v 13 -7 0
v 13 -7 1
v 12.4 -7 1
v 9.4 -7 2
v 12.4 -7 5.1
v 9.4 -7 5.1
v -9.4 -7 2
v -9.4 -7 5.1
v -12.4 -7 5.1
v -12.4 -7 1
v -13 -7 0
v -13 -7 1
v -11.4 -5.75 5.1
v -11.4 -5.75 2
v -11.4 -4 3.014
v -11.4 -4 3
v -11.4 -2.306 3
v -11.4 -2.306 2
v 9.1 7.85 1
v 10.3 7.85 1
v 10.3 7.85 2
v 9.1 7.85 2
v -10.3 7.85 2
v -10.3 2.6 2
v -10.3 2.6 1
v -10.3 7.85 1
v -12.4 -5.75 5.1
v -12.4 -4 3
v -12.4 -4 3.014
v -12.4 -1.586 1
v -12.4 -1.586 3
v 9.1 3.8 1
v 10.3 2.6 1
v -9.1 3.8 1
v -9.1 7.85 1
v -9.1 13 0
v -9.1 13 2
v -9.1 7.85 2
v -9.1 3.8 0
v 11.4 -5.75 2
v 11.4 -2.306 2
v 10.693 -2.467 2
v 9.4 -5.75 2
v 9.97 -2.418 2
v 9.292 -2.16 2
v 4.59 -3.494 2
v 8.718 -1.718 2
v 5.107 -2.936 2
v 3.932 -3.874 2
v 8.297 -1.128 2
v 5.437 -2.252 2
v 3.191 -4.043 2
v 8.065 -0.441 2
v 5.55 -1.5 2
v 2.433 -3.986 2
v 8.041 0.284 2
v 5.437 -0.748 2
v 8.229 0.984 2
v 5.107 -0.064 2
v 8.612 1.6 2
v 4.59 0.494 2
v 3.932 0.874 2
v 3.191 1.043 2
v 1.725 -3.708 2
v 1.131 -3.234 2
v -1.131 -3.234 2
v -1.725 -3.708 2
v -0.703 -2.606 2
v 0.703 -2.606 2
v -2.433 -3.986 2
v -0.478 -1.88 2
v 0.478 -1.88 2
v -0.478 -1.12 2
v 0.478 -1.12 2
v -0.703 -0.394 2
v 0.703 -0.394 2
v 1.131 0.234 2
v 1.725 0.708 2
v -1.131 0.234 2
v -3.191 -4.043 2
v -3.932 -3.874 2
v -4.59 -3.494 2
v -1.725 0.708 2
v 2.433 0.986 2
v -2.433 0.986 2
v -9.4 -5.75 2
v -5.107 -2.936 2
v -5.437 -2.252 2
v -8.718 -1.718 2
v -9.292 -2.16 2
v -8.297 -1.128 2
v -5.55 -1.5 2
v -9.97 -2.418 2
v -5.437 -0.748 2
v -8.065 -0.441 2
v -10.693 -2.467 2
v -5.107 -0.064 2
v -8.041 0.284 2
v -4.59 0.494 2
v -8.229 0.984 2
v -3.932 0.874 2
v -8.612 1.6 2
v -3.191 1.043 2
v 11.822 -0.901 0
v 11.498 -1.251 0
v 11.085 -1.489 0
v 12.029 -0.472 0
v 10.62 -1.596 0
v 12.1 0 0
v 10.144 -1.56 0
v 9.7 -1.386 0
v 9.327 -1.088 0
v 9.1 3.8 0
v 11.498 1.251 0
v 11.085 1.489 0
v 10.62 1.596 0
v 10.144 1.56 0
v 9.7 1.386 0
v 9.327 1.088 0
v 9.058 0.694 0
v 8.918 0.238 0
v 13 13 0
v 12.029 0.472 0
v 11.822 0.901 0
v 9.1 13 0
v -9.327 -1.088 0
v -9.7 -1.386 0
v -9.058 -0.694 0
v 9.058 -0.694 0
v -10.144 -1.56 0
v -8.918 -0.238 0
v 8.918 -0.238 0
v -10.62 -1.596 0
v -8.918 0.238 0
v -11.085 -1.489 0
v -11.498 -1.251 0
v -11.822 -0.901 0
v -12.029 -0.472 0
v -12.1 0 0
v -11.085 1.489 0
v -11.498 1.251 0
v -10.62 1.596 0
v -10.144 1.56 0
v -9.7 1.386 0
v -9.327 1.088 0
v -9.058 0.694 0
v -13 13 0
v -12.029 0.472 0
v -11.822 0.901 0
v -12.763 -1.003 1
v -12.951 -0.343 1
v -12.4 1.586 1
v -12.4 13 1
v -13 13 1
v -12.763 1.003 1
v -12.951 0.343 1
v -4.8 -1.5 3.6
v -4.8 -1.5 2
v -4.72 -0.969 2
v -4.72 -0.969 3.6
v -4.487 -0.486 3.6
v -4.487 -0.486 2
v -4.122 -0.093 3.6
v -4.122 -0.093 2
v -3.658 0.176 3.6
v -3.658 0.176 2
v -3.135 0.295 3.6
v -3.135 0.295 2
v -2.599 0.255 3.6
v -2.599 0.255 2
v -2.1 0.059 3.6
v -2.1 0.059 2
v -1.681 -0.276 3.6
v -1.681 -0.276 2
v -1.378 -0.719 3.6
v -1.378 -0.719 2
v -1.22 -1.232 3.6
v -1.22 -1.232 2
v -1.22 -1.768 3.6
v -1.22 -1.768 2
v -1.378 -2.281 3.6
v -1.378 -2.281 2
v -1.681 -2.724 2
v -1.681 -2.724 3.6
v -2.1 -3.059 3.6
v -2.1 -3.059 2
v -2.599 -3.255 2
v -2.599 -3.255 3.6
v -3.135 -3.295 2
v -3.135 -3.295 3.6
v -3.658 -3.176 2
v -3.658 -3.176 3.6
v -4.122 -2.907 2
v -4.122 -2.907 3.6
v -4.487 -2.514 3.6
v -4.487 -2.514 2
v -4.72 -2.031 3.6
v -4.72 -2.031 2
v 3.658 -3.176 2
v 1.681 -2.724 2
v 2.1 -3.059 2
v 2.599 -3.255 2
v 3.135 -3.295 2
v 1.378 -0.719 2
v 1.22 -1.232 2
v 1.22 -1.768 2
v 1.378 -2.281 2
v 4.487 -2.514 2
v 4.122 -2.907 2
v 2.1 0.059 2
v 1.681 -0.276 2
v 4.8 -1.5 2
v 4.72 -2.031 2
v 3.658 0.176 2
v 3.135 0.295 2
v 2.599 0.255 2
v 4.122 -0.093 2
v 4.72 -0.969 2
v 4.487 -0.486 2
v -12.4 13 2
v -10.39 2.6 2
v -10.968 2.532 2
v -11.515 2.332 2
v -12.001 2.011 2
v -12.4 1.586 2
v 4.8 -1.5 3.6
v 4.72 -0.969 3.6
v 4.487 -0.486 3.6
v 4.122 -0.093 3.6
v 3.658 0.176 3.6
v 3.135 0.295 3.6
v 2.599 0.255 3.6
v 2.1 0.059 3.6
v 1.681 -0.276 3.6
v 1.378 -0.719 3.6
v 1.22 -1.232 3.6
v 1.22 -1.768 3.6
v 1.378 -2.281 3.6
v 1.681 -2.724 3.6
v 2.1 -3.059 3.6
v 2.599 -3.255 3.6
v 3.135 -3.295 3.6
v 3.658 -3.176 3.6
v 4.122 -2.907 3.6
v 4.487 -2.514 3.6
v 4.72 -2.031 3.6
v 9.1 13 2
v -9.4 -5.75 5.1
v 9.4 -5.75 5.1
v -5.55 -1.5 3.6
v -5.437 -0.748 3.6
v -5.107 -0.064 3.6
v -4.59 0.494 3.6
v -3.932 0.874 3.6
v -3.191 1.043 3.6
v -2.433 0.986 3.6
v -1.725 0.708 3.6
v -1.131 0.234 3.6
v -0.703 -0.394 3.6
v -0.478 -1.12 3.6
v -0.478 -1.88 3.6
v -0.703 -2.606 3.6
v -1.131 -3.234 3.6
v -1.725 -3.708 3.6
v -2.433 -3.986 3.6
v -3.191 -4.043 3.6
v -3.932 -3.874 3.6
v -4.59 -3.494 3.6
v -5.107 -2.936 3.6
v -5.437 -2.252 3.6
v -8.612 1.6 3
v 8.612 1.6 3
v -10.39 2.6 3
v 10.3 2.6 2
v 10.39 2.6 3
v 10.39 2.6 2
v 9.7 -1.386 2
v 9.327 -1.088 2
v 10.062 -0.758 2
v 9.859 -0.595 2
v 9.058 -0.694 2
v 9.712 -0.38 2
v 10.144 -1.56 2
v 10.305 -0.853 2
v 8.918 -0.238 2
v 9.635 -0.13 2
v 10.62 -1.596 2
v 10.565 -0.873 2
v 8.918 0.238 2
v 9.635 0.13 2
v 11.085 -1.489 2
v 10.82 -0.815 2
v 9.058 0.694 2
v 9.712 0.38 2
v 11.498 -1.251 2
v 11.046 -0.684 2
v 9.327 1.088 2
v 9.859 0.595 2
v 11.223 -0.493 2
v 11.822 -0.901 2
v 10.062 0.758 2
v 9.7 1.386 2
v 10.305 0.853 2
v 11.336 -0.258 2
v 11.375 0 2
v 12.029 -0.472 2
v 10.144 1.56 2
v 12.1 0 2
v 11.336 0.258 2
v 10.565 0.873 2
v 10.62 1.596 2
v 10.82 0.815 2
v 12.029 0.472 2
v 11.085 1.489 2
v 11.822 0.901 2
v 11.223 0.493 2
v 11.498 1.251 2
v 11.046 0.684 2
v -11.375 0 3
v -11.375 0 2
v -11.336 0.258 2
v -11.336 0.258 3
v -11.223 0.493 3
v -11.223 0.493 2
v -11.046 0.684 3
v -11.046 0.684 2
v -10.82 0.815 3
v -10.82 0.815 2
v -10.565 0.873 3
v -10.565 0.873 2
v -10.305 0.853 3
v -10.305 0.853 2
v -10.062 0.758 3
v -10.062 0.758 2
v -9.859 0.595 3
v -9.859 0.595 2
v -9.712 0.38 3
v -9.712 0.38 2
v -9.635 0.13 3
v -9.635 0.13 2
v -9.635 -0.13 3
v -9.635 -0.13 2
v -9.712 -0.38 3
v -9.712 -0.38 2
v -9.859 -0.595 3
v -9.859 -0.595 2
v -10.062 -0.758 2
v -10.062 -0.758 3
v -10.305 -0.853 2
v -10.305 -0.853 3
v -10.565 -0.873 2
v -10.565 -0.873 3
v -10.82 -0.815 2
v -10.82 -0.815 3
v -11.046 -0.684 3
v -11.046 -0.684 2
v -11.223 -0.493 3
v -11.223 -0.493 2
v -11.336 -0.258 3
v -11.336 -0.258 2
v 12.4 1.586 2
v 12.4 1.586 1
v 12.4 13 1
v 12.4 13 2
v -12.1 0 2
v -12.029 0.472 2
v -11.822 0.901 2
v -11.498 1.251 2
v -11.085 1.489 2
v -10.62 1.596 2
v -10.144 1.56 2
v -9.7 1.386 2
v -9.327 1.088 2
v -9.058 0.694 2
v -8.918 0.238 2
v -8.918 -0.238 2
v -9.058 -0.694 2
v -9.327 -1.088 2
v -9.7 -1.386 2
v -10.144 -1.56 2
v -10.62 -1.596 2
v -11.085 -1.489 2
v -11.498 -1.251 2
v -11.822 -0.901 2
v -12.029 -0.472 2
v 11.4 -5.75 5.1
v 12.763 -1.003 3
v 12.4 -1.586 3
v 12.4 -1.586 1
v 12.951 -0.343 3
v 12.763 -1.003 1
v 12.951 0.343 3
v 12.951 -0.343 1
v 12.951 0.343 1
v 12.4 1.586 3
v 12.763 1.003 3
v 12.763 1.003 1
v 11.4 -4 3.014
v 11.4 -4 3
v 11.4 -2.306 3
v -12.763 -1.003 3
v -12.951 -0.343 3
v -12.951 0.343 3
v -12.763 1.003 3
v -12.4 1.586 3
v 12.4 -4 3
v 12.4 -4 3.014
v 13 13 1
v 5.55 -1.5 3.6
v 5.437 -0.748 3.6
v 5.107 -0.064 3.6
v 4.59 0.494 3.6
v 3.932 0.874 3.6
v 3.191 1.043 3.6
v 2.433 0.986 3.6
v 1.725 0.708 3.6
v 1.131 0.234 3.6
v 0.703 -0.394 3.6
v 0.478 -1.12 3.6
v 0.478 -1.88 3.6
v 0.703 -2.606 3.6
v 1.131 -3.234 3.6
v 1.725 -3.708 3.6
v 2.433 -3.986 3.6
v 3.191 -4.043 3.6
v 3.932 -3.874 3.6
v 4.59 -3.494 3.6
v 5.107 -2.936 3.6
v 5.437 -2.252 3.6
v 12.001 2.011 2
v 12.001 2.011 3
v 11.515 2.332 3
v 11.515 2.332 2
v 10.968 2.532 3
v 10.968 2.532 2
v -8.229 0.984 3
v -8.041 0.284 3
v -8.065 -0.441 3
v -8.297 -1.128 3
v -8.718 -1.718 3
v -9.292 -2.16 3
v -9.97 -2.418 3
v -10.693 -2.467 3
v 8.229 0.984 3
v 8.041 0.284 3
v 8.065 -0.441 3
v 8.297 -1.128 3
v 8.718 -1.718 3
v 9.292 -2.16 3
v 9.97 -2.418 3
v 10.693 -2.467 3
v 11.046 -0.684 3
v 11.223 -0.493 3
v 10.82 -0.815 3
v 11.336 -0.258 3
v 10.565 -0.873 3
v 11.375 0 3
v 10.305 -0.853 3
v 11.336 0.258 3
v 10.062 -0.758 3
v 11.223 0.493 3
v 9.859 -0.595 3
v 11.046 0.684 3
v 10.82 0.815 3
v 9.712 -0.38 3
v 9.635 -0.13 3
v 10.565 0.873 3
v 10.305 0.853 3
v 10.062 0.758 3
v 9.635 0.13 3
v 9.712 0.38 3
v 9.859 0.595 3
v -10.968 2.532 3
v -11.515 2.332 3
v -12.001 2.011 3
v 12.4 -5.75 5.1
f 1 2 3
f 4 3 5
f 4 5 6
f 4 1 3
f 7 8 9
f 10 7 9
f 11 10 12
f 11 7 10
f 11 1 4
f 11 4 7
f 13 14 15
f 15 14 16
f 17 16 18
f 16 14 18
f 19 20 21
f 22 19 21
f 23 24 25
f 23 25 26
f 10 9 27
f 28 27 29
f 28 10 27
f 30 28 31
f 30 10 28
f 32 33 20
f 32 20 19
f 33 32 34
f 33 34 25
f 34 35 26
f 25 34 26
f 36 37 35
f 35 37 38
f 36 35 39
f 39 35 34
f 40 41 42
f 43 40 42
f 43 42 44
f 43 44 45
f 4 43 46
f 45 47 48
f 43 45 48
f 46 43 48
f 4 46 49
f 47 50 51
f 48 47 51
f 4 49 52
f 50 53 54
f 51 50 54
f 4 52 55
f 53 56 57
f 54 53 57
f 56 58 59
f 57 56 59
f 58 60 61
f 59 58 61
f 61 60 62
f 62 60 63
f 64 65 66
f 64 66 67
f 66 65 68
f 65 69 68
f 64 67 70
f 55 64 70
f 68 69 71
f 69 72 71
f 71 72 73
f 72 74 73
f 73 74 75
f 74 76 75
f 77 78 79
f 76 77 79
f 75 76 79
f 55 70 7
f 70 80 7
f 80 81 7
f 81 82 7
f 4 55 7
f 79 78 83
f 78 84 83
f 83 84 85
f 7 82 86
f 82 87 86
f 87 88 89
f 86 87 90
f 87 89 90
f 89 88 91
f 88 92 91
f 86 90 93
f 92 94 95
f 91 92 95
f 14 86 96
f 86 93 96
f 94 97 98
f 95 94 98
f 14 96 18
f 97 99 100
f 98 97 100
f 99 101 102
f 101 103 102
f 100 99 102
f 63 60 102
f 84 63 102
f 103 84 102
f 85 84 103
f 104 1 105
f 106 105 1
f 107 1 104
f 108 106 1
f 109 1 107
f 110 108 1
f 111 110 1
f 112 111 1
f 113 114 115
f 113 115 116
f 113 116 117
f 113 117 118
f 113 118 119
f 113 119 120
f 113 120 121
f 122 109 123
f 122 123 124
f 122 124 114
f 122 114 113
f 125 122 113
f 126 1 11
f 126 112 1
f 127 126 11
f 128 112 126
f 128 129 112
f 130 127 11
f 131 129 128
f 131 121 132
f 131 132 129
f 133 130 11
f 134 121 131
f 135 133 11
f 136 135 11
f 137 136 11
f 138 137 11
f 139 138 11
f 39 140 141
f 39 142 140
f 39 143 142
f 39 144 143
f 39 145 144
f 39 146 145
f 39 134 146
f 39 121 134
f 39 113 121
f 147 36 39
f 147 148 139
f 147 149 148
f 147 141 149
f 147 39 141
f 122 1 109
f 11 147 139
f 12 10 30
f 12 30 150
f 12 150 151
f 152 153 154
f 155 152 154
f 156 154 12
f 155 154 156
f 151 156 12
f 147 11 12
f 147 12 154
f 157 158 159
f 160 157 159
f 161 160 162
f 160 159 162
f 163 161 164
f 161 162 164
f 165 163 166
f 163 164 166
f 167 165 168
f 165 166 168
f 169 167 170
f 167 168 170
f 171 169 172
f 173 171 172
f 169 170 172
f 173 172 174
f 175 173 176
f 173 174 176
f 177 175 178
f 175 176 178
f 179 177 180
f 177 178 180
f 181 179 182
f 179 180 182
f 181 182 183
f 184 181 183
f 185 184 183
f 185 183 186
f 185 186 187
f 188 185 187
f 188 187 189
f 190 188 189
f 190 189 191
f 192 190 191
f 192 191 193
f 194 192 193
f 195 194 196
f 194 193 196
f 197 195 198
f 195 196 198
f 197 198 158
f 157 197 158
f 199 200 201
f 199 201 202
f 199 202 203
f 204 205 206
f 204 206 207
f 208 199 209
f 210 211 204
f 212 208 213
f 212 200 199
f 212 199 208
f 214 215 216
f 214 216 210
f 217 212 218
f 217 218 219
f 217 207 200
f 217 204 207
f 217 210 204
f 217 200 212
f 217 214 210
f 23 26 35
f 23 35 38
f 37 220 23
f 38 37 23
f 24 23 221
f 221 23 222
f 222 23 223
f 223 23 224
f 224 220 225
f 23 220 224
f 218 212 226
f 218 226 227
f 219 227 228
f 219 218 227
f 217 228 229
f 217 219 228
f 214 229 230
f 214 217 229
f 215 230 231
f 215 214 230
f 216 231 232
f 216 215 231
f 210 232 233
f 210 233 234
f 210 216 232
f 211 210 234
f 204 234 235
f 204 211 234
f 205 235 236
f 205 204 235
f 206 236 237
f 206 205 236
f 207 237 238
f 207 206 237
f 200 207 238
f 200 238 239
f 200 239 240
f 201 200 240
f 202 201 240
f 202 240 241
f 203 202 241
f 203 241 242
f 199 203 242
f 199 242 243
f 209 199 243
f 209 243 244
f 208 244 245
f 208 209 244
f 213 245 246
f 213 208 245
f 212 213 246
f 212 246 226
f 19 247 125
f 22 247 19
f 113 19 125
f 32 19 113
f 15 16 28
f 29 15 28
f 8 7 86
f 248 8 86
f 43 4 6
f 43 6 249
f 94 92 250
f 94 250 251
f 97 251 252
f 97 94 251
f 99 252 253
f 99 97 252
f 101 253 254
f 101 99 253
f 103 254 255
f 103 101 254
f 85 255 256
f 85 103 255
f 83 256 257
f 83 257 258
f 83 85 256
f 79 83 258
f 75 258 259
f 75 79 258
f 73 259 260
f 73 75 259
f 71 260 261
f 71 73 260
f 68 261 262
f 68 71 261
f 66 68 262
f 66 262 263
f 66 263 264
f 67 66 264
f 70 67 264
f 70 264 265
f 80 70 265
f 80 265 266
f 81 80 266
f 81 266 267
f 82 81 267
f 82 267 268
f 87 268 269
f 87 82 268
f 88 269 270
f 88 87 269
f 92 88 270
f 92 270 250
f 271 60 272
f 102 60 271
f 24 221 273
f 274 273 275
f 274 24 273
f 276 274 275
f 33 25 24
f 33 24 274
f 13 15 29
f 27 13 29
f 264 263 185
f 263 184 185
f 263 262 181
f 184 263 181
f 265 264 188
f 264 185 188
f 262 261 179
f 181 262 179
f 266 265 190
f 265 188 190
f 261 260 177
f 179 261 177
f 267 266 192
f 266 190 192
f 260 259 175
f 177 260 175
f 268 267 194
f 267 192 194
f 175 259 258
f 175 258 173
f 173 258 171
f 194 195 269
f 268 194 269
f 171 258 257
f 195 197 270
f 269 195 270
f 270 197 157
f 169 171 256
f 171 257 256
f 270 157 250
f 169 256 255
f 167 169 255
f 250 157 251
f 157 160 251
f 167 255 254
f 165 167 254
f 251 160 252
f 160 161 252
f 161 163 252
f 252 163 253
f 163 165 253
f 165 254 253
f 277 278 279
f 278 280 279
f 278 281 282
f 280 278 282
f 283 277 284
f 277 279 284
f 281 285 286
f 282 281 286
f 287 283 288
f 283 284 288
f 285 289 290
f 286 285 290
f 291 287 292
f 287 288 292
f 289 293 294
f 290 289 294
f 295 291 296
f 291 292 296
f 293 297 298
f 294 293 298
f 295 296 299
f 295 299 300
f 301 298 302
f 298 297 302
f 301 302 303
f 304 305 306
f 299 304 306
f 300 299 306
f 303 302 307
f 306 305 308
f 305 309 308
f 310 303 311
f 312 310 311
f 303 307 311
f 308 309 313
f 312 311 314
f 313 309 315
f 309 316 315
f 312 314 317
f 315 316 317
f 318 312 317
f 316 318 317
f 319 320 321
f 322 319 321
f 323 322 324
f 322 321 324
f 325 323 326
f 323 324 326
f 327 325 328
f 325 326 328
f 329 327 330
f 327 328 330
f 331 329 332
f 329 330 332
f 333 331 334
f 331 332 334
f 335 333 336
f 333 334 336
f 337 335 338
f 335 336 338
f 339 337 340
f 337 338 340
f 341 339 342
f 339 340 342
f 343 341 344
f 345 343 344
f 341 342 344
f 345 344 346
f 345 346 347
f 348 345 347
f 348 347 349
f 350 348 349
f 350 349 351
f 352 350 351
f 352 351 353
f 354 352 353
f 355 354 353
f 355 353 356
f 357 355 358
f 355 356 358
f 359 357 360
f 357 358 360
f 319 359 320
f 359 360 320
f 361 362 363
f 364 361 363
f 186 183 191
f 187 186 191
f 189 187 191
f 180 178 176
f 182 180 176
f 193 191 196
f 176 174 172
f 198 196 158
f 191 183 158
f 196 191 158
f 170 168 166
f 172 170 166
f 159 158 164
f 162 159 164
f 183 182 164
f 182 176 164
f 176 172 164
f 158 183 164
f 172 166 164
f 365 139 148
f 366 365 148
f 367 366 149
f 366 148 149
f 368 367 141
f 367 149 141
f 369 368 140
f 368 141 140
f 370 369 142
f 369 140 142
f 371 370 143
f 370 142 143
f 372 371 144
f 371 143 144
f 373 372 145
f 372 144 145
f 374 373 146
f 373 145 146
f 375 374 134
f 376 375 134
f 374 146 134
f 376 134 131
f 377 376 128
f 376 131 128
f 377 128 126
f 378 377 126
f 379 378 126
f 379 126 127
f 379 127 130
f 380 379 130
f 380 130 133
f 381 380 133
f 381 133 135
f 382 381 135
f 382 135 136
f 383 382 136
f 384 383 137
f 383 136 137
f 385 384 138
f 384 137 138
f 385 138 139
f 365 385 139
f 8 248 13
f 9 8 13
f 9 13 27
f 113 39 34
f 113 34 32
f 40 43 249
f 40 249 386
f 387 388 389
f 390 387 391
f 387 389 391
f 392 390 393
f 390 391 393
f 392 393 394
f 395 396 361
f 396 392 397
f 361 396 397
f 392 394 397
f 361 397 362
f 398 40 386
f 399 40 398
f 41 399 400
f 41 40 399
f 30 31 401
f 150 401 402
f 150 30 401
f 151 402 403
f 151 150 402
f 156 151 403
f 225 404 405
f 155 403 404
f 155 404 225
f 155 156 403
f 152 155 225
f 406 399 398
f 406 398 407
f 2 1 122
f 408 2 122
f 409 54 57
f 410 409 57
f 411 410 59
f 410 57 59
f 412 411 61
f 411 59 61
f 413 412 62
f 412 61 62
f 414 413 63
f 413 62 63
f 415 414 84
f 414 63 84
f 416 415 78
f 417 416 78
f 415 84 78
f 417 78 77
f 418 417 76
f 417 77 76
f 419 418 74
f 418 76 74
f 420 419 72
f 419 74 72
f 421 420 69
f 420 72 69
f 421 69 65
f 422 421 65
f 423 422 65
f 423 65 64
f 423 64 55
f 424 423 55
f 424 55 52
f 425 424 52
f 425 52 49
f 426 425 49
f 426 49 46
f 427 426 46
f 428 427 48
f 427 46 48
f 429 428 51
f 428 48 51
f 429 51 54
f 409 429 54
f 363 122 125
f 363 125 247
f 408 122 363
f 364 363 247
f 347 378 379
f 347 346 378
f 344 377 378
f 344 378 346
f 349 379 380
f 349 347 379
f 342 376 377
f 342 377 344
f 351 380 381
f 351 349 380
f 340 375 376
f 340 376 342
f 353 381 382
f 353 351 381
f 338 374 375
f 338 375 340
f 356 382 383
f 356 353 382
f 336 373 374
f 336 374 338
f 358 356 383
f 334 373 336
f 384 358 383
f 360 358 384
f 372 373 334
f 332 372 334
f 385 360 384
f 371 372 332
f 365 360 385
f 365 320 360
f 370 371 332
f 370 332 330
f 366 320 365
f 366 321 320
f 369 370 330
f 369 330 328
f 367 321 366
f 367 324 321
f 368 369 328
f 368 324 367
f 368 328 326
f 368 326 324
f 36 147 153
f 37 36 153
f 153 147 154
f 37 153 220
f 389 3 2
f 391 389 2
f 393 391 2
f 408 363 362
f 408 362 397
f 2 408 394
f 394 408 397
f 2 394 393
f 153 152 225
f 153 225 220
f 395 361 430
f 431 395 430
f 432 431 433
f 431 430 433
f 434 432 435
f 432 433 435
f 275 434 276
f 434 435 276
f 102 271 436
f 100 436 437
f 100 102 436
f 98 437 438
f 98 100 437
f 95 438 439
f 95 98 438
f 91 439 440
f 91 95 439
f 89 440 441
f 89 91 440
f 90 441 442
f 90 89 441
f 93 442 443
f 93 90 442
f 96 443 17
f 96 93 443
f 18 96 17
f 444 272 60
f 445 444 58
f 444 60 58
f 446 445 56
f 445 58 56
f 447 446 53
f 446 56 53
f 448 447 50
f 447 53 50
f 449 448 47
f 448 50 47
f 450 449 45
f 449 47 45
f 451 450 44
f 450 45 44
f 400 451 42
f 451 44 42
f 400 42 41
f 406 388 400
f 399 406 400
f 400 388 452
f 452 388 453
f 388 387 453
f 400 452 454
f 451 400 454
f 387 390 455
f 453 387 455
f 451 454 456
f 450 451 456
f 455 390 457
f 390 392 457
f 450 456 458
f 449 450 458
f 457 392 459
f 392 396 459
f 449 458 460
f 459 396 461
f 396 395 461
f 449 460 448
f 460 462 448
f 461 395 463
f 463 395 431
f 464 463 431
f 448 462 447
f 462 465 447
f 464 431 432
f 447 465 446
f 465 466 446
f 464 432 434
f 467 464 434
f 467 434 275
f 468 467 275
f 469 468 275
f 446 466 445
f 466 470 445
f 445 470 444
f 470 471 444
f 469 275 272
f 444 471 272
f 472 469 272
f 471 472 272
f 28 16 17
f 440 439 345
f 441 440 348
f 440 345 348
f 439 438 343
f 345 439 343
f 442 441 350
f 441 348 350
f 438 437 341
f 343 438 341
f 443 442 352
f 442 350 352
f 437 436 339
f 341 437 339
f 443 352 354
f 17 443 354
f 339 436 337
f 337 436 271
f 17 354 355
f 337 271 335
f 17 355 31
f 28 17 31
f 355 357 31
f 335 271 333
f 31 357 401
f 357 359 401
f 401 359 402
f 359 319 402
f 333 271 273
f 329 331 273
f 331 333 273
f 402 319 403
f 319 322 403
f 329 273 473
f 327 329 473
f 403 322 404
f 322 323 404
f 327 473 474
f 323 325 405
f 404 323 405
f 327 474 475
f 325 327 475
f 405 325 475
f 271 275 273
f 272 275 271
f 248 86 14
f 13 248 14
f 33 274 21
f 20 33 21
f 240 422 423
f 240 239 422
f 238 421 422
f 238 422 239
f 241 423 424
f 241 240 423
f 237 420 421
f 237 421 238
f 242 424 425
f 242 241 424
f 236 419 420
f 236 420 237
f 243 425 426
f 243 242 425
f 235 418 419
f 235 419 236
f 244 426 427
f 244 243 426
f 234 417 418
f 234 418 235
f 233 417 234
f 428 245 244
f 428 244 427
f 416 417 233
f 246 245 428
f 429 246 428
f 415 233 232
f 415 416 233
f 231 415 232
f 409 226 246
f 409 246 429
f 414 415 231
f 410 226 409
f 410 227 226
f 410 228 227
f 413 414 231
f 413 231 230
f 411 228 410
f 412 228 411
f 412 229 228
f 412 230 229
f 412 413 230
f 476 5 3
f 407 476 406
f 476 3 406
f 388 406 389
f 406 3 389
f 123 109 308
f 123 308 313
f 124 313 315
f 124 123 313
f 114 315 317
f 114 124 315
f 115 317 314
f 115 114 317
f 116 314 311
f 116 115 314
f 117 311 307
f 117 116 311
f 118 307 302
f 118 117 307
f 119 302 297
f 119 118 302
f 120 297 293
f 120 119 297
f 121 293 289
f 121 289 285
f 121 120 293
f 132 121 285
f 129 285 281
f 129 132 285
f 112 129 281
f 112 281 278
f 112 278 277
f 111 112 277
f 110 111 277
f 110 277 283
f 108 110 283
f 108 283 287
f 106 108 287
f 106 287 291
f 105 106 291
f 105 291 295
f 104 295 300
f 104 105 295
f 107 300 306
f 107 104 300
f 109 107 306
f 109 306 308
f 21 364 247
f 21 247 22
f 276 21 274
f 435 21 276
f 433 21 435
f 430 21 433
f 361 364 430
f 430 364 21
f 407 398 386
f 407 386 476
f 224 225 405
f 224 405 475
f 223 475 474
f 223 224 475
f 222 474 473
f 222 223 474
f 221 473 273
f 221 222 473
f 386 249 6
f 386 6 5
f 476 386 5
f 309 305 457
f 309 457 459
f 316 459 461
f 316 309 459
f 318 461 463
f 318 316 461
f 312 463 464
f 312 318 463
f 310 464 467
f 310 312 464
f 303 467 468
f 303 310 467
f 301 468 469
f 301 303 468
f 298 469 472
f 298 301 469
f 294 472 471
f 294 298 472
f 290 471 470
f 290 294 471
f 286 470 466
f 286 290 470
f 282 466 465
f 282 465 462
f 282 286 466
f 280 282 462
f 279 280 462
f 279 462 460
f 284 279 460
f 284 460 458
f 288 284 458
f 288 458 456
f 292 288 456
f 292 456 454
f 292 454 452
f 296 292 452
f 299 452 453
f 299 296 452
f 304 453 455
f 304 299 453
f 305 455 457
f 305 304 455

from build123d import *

# Parameters (mm, degrees)
F1_DEPTH     = 2
F2_W         = 0.6
F2_H         = 20
F3_DEPTH     = 1
F5_DEPTH     = 1
F6_W         = 3
F6_H         = 1.25
F7_DEPTH     = 3.1
F8_W         = 1
F8_H         = 1.75
F9_DEPTH     = 2.1
F10_SIZE2    = 2.085568787
F10_SIZE     = 1.75
F11_R        = 2.475
F11_R_2      = 0.875
F12_DEPTH    = 3
F13_T1_DEPTH = 6.0259261824
F14_R        = 0.875
F15_DEPTH    = 5.101
F17_DEPTH    = 1
F18_W        = 5.15
F18_H        = 1
F19_DEPTH    = 1.2
F20_R        = 1.6
F21_DEPTH    = 2
F22_R        = 2.55
F22_R_2      = 1.8
F23_DEPTH    = 1.6


# Not quite as in the source:
# - a fillet or chamfer that OpenCascade refuses, or shapes differently, is made with other operations: its cross-section is extruded or revolved along the edge and cut away or added


with BuildPart() as f1:
    # F0 (on Top) → F1 (new body)
    with BuildSketch(Plane.XY):
        Polygon((0, 3.8), (0, -7), (13, -7), (13, 13), (9.1, 13), (9.1, 3.8), align=None)
    extrude(amount=F1_DEPTH)

    # F2 (on face) → F3 (cut)
    with BuildSketch(Plane.XY.offset(2)):
        with Locations((12.7, 3)):
            Rectangle(F2_W, F2_H)
    extrude(amount=-F3_DEPTH, mode=Mode.SUBTRACT)

    # F4 (on face) → F5 (join)
    with BuildSketch(Plane.XY.offset(2)):
        Polygon((12.4, -7), (12.4, 2.6), (0, 2.6), (0, 1.6), (11.4, 1.6), (11.4, -7), align=None)
    extrude(amount=F5_DEPTH)

    # F6 (on face) → F7 (join)
    with BuildSketch(Plane.XY.offset(2)):
        with Locations((10.9, -6.375)):
            Rectangle(F6_W, F6_H)
    extrude(amount=F7_DEPTH)

    # F8 (on face) → F9 (join)
    with BuildSketch(Plane.XY.offset(3)):
        with Locations((11.9, -4.875)):
            Rectangle(F8_W, F8_H)
    extrude(amount=F9_DEPTH)

    # F10
    f10_edges = [f1.edges().sort_by_distance(p)[0] for p in [
        (11.9, -4, 5.1),
    ]]
    f10_side = f1.faces().sort_by_distance((11.218182, -5.897727, 5.1))[0]
    chamfer(f10_edges, length=F10_SIZE, length2=F10_SIZE2, reference=f10_side)

    # F11 (on Top) → F12 (join)
    with BuildSketch(Plane.XY):
        with Locations((10.5, 0)):
            Circle(F11_R)
        with Locations((10.5, 0)):
            Circle(F11_R_2, mode=Mode.SUBTRACT)
    extrude(amount=F12_DEPTH)

    # F13: fillet of radius 2.5 on 1 edges, made by hand

    # F13_s2 → F13_t1 (cut)
    with BuildSketch(Plane.XY.offset(2)):
        with BuildLine():
            ThreePointArc((12.4, 1.5860721926), (11.515422474, 2.3321716423), (10.389629527, 2.6))
            Line((10.389629527, 2.6), (12.4, 2.6))
            Line((12.4, 2.6), (12.4, 1.5860721926))
        make_face()
    extrude(amount=F13_T1_DEPTH, mode=Mode.SUBTRACT)

    # F14 (on face) → F15 (cut, through all)
    with BuildSketch(Plane.XY):
        with Locations((10.5, 0)):
            Circle(F14_R)
    extrude(amount=F15_DEPTH, mode=Mode.SUBTRACT)

    # F16 (on face) → F17 (cut)
    with BuildSketch(Plane.XY.offset(2)):
        Polygon((10.3, 13), (9.1, 13), (9.1, 3.8), (0, 3.8), (0, 2.6), (10.3, 2.6), align=None)
    extrude(amount=-F17_DEPTH, mode=Mode.SUBTRACT)

    # F18 (on face) → F19 (join)
    with BuildSketch(Plane(origin=(10.3, 0, 0), x_dir=(0, -1, 0), z_dir=(-1, 0, 0))):
        with Locations((-10.425, 1.5)):
            Rectangle(F18_W, F18_H)
    extrude(amount=F19_DEPTH)

    # F20 (on face) → F21 (cut)
    with BuildSketch(Plane.XY):
        with Locations((10.5, 0)):
            Circle(F20_R)
    extrude(amount=F21_DEPTH, mode=Mode.SUBTRACT)

    # F22 (on face) → F23 (join)
    with BuildSketch(Plane.XY.offset(2)):
        with Locations((3, -1.5)):
            Circle(F22_R)
        with Locations((3, -1.5)):
            Circle(F22_R_2, mode=Mode.SUBTRACT)
    extrude(amount=F23_DEPTH)

    # F24: F1 across face


with BuildPart() as f1_1:
    add(f1.part)
    add(f1.part.mirror(Plane(origin=(0, -1.6962616822, 1.0420560748), x_dir=(0, -1, 0), z_dir=(-1, 0, 0))))


solid = f1_1.part
